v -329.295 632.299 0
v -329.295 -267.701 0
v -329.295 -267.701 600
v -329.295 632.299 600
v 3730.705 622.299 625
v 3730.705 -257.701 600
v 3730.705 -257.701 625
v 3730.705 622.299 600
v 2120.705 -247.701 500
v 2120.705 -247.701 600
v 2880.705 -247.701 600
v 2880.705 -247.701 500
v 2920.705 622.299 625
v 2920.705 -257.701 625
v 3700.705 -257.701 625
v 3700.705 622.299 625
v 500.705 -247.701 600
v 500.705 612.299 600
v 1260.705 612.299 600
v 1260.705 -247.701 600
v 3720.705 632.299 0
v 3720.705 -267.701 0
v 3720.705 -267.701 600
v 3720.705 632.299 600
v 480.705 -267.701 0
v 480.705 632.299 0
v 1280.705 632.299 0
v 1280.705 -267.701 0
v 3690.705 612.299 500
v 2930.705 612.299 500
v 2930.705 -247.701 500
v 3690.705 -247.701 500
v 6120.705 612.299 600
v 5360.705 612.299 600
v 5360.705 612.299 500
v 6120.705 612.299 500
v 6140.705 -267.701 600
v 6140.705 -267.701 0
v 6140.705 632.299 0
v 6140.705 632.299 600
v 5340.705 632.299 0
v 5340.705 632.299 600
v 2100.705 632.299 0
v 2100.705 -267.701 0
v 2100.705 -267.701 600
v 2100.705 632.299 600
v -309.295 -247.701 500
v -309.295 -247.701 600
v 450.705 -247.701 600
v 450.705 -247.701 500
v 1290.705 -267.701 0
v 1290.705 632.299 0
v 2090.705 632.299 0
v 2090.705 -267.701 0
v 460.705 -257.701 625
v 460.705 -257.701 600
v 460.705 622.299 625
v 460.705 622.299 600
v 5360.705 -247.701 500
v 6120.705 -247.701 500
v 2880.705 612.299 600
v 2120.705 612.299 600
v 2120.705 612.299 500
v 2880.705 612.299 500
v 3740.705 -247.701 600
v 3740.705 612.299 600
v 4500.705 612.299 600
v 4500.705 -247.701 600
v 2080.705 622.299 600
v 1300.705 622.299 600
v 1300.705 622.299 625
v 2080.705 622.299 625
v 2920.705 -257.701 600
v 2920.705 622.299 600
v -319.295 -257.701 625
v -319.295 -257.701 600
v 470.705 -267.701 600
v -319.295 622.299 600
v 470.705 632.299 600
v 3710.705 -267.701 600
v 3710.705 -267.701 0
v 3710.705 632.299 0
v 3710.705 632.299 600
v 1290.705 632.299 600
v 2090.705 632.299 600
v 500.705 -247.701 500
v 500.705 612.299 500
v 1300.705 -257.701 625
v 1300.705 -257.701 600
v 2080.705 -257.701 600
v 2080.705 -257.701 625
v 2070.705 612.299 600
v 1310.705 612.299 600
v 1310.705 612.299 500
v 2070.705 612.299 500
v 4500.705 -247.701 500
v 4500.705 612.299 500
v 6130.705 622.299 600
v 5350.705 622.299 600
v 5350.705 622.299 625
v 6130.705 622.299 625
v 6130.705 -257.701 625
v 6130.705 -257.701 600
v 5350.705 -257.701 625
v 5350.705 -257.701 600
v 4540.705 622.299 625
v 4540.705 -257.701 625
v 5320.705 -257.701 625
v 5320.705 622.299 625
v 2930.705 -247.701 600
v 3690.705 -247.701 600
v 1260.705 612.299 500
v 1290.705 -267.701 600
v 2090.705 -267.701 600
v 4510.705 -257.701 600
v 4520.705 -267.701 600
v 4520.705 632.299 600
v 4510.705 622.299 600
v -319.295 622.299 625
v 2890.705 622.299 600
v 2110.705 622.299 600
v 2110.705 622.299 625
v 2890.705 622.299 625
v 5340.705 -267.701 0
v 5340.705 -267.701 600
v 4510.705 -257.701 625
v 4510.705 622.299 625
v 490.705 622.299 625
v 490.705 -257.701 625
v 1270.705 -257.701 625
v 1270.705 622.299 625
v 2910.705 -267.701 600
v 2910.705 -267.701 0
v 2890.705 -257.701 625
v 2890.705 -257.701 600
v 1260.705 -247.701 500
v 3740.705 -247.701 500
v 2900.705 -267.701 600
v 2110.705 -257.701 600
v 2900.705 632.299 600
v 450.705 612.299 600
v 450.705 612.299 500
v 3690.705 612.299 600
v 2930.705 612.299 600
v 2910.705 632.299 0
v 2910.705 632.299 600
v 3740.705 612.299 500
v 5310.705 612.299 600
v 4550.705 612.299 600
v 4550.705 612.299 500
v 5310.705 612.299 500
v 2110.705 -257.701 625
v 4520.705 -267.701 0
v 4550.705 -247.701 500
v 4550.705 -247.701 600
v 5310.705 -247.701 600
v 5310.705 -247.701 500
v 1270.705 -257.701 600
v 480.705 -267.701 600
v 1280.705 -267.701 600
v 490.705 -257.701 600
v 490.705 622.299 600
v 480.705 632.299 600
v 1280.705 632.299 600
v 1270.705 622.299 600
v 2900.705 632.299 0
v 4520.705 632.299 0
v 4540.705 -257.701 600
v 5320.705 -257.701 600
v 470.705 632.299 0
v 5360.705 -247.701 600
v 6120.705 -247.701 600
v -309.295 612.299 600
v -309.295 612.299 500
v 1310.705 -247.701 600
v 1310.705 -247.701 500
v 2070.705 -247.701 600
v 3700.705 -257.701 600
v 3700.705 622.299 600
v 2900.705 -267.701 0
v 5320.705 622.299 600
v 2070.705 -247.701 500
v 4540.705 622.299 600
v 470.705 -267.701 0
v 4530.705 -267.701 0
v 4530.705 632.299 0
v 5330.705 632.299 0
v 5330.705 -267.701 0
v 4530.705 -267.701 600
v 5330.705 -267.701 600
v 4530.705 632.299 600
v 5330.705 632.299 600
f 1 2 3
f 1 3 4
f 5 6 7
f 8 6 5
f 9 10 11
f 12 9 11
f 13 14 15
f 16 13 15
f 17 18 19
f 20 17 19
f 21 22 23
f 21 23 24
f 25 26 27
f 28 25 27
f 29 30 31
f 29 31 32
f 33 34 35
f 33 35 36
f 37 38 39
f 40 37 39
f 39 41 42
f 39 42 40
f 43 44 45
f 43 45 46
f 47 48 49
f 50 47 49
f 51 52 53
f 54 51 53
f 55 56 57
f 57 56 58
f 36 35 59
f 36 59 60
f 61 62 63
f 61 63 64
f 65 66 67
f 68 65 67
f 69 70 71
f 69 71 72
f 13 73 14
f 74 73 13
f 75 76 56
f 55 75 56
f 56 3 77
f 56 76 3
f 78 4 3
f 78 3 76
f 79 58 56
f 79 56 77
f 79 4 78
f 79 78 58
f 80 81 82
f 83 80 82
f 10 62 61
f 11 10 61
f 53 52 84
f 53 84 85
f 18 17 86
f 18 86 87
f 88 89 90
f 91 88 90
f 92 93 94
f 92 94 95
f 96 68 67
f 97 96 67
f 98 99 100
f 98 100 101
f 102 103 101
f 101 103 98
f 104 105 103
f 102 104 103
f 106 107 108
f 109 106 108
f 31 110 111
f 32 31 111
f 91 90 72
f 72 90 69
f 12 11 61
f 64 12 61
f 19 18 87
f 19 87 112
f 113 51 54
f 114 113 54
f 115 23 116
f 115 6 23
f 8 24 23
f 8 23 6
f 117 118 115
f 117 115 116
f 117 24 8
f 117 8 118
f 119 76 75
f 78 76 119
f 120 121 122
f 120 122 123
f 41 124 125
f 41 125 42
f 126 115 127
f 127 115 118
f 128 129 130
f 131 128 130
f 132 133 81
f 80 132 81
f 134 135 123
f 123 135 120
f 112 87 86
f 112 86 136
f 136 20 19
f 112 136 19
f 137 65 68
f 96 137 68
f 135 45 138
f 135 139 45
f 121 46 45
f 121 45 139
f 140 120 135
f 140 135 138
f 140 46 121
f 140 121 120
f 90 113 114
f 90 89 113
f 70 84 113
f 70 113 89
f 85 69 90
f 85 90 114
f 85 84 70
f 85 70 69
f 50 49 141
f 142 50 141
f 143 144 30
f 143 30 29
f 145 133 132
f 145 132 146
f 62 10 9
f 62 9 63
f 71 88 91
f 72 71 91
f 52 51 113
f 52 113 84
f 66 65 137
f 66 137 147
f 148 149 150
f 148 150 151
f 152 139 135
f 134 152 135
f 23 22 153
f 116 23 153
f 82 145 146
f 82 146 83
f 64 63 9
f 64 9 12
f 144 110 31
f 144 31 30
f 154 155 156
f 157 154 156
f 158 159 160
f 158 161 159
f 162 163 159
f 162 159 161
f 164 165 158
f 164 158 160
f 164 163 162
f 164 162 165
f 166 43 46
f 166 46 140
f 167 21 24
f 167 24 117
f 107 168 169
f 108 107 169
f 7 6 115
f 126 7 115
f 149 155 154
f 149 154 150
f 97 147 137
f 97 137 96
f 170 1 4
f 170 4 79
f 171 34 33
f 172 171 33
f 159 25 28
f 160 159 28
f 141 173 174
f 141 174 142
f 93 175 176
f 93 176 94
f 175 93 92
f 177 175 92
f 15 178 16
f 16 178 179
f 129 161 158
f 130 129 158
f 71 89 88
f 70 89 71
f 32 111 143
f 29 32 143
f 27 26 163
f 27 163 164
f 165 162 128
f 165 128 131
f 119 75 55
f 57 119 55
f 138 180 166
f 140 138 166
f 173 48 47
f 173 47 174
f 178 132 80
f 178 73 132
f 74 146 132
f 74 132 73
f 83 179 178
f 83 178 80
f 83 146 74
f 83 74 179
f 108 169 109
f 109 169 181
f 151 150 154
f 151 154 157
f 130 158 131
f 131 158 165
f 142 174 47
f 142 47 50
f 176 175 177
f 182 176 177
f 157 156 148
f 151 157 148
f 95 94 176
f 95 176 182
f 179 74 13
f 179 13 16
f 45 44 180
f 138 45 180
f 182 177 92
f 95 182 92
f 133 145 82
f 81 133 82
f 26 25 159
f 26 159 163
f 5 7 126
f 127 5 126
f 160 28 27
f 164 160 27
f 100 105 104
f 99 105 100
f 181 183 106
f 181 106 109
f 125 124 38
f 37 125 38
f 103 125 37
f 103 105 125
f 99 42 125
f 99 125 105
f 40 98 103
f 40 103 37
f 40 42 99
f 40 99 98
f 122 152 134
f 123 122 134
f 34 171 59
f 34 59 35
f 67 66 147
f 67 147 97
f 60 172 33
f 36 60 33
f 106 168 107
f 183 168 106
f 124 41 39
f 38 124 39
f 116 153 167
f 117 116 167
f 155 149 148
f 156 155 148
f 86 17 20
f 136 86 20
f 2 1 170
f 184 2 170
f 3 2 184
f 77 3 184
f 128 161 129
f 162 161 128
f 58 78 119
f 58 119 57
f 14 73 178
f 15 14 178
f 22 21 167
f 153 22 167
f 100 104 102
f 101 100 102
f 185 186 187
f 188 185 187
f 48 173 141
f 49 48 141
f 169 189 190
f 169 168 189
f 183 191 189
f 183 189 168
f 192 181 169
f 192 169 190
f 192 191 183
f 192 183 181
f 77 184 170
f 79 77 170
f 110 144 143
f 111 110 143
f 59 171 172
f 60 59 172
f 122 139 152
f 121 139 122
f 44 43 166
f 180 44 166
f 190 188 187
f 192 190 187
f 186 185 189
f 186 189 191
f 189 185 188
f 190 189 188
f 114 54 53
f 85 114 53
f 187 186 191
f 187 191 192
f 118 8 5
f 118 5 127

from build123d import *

# Parameters (mm, degrees)
SKETCH5_W           = 800
SKETCH5_H           = 900
BOSS_EXTRUDE7_DEPTH = 600
SKETCH6_W           = 760
SKETCH6_H           = 860
CUT_EXTRUDE3_DEPTH  = 100
SKETCH10_W          = 780
SKETCH10_H          = 880
BOSS_EXTRUDE8_DEPTH = 25


with BuildPart() as part:
    # Sketch5 → Boss-Extrude7 (new body)
    with BuildSketch(Plane.XY):
        with Locations((70.705071793, 182.298806907)):
            Rectangle(SKETCH5_W, SKETCH5_H)
    extrude(amount=BOSS_EXTRUDE7_DEPTH)

    # Sketch6 → Cut-Extrude3 (cut)
    with BuildSketch(Plane.XY.offset(600)):
        with Locations((70.705071793, 182.298806907)):
            Rectangle(SKETCH6_W, SKETCH6_H)
    extrude(amount=-CUT_EXTRUDE3_DEPTH, mode=Mode.SUBTRACT)

    # Sketch10 → Boss-Extrude8 (add)
    with BuildSketch(Plane.XY.offset(600)):
        with Locations((70.705071793, 182.298806907)):
            Rectangle(SKETCH10_W, SKETCH10_H)
    extrude(amount=BOSS_EXTRUDE8_DEPTH)


with BuildPart() as body_2:
    # Body-Move/Copy2: read off the stored shape, not the designer's step
    # Body-Move/Copy2: copy of part
    add(part.part.moved(Location((5670, 0, 0))))


with BuildPart() as body_3:
    # Body-Move_Copy2 2: copy of part
    add(part.part.moved(Location((4860, 0, 0))))


with BuildPart() as body_4:
    # Body-Move_Copy2 3: copy of part
    add(part.part.moved(Location((4050, 0, 0))))


with BuildPart() as body_5:
    # Body-Move_Copy2 4: copy of part
    add(part.part.moved(Location((3240, 0, 0))))


with BuildPart() as body_6:
    # Body-Move_Copy2 5: copy of part
    add(part.part.moved(Location((2430, 0, 0))))


with BuildPart() as body_7:
    # Body-Move_Copy2 6: copy of part
    add(part.part.moved(Location((1620, 0, 0))))


with BuildPart() as body_8:
    # Body-Move_Copy2 7: copy of part
    add(part.part.moved(Location((810, 0, 0))))


with BuildPart() as body_9:
    # Body-Move_Copy2 8: copy of part
    add(part.part.moved(Location((7290, 0, 0))))


with BuildPart() as body_10:
    # Body-Move_Copy2 9: copy of part
    add(part.part.moved(Location((6480, 0, 0))))


solid = Compound([part.part, body_2.part, body_3.part, body_4.part, body_5.part, body_6.part, body_7.part, body_8.part])
